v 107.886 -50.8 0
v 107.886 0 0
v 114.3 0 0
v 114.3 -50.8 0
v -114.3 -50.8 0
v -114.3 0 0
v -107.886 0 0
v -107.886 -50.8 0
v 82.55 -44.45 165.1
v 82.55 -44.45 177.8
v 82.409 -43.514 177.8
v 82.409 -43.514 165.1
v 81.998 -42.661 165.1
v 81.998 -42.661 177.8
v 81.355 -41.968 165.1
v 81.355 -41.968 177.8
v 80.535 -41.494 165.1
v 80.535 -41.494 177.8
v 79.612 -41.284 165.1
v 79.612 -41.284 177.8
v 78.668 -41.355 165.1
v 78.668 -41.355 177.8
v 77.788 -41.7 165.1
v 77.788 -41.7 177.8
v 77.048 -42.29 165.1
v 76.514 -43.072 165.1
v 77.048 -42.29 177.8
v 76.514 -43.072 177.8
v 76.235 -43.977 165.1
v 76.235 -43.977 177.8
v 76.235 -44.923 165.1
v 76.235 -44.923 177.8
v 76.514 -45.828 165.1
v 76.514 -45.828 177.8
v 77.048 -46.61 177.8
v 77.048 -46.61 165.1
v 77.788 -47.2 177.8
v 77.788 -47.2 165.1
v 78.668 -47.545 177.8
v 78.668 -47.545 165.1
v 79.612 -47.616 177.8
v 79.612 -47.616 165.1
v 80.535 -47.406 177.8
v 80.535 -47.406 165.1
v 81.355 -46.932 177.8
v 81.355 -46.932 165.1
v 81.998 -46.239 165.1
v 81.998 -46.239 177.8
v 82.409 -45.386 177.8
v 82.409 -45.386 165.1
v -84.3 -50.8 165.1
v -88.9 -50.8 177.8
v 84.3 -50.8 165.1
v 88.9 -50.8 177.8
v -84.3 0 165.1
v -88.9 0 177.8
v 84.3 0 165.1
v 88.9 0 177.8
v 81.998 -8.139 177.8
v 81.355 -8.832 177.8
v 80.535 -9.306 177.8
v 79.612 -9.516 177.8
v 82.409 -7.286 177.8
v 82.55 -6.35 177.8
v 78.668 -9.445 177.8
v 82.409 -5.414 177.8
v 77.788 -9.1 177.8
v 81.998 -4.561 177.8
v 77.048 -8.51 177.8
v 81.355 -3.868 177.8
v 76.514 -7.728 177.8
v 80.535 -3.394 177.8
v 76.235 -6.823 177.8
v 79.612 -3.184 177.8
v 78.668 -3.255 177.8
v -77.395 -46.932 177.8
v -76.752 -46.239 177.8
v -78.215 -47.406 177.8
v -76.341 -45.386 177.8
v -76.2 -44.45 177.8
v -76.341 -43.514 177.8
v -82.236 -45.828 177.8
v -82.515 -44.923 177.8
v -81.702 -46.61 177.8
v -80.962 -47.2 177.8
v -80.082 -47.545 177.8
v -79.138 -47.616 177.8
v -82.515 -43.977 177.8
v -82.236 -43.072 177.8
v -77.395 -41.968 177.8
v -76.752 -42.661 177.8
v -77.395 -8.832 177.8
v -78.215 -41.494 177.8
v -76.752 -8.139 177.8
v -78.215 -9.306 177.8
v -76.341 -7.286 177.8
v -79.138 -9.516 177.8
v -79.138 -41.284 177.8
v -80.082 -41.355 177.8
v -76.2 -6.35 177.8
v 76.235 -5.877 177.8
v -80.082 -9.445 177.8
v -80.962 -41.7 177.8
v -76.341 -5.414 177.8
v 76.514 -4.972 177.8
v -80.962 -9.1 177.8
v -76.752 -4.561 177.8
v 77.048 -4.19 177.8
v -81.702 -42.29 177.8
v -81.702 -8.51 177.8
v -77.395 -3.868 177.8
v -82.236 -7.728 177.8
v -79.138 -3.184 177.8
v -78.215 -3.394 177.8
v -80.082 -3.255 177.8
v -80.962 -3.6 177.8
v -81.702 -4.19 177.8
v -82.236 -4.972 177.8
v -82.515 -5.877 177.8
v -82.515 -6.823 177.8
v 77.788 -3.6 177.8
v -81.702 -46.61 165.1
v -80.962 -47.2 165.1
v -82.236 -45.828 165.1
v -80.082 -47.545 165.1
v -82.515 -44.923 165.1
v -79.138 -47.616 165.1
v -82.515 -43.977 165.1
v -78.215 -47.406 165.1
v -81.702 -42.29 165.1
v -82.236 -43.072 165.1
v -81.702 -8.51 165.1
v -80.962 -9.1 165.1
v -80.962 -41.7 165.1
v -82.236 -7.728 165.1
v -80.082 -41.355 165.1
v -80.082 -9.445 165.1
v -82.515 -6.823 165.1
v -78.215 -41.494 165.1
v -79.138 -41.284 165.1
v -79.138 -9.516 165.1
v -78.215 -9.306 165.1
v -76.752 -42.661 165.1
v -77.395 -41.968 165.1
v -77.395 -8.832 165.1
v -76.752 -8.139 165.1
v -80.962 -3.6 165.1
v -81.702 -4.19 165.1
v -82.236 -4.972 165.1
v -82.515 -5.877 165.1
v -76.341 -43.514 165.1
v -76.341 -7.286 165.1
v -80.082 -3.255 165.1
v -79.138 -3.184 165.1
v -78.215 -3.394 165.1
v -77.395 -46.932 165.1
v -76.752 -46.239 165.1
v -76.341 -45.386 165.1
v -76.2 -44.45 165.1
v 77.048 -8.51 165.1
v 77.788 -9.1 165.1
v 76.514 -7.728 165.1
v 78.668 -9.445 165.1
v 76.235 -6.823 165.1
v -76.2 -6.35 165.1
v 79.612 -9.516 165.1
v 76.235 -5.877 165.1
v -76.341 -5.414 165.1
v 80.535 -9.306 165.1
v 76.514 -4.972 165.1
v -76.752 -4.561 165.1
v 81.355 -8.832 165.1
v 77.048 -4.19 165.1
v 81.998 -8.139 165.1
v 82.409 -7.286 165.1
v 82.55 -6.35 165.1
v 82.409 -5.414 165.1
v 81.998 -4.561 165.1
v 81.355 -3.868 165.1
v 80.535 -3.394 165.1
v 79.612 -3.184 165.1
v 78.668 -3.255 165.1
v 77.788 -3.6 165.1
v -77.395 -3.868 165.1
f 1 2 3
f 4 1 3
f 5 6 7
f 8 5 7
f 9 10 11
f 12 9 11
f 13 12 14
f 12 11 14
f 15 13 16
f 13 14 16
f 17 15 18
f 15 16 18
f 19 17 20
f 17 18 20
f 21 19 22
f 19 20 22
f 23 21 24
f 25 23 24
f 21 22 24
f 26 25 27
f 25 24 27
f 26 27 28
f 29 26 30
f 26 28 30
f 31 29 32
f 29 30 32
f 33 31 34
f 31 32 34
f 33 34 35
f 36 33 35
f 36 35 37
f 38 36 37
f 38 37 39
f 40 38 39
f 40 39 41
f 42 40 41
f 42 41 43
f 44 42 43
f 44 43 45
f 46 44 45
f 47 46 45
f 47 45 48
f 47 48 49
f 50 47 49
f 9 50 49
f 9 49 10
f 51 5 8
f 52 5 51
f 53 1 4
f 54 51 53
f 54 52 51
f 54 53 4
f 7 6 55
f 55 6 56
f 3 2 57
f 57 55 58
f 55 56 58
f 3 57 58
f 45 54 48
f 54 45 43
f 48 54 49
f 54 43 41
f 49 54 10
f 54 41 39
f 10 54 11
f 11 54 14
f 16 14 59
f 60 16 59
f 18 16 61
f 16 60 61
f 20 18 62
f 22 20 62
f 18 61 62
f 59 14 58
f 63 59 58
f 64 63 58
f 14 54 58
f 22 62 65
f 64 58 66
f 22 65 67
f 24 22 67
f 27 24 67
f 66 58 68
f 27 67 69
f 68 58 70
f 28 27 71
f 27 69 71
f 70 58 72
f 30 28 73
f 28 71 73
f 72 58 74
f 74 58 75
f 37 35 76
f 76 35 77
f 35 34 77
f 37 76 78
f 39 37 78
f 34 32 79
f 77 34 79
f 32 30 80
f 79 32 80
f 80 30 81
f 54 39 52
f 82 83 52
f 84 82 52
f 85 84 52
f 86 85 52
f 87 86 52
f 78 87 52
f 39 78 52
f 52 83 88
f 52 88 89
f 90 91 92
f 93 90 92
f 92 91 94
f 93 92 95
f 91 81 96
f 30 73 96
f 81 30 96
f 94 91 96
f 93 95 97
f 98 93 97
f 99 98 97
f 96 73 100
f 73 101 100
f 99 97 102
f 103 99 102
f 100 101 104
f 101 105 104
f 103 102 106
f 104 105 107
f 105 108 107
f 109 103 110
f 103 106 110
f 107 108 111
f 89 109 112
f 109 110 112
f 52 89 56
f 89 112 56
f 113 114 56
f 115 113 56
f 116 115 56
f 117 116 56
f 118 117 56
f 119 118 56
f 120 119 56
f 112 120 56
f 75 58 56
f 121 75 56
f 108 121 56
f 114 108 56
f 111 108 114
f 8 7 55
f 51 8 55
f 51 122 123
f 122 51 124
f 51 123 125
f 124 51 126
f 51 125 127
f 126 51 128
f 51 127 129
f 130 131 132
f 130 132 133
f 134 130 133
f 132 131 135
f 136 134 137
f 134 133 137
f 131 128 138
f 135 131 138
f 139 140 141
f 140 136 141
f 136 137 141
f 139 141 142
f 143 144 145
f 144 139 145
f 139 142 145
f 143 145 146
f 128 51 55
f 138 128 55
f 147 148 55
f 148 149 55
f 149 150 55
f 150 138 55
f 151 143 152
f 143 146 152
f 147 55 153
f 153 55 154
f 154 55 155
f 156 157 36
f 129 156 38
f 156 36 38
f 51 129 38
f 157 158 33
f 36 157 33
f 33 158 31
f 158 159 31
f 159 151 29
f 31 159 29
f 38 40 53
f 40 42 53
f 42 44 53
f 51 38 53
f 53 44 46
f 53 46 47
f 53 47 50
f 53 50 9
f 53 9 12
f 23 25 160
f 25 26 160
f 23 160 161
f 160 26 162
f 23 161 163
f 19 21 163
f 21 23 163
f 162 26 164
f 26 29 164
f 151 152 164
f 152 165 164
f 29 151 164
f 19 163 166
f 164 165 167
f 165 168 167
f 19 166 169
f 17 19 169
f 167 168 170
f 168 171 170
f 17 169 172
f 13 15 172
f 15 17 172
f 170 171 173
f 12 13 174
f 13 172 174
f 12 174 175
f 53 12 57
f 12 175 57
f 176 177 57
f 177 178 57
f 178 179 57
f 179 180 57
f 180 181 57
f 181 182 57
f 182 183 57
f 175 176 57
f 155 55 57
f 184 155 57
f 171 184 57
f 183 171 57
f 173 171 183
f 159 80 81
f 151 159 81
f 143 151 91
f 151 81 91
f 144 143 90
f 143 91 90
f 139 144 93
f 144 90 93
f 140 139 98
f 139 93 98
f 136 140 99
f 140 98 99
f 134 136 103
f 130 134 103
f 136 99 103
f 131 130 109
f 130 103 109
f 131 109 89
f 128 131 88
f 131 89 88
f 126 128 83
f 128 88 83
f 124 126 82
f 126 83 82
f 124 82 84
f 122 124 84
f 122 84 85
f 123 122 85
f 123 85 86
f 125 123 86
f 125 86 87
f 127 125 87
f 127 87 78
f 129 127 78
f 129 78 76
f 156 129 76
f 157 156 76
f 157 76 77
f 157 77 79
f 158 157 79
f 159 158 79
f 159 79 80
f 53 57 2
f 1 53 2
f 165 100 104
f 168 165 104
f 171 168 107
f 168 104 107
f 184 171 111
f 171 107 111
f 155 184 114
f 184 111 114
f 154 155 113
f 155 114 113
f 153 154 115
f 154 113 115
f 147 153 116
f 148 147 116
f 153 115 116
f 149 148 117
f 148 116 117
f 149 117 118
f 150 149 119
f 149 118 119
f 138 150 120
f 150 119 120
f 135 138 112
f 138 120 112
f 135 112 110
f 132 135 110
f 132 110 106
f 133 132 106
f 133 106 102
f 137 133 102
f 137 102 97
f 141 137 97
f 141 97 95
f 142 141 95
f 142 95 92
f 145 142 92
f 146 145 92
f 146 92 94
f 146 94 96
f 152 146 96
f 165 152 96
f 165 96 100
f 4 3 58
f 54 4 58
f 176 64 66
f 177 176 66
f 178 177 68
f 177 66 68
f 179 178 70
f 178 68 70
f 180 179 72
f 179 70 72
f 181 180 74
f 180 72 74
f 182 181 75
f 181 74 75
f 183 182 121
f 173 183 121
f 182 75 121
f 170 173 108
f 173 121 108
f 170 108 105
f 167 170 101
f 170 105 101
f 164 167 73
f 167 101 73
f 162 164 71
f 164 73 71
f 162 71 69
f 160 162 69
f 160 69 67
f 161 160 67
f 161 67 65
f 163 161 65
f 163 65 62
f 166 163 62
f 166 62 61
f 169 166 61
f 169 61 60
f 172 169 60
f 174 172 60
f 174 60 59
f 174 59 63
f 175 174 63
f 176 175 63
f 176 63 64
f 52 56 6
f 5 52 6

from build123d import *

# Parameters (mm, degrees)
F1_DEPTH = 50.8
F3_R     = 3.175
F4_DEPTH = 177.801


with BuildPart() as f1:
    # F0 (on Front) → F1 (new body)
    with BuildSketch(Plane.XZ):
        Polygon((25.4, 177.8), (0, 0), (6.414469, 0), (30.000183, 165.1), (198.599817, 165.1), (222.185531, 0), (228.6, 0), (203.2, 177.8), align=None)
    extrude(amount=F1_DEPTH)


with BuildPart() as f1_1:
    # F2: moved
    add(f1.part.moved(Location((-114.3, 0, 0))))

    # F3 (on face) → F4 (cut, through all)
    with BuildSketch(Plane.XY.offset(177.8)):
        with Locations((-79.375, -6.35)):
            Circle(F3_R)
        with Locations((-79.375, -44.45)):
            Circle(F3_R)
        with Locations((79.375, -6.35)):
            Circle(F3_R)
        with Locations((79.375, -44.45)):
            Circle(F3_R)
    extrude(amount=-F4_DEPTH, mode=Mode.SUBTRACT)


solid = f1_1.part
